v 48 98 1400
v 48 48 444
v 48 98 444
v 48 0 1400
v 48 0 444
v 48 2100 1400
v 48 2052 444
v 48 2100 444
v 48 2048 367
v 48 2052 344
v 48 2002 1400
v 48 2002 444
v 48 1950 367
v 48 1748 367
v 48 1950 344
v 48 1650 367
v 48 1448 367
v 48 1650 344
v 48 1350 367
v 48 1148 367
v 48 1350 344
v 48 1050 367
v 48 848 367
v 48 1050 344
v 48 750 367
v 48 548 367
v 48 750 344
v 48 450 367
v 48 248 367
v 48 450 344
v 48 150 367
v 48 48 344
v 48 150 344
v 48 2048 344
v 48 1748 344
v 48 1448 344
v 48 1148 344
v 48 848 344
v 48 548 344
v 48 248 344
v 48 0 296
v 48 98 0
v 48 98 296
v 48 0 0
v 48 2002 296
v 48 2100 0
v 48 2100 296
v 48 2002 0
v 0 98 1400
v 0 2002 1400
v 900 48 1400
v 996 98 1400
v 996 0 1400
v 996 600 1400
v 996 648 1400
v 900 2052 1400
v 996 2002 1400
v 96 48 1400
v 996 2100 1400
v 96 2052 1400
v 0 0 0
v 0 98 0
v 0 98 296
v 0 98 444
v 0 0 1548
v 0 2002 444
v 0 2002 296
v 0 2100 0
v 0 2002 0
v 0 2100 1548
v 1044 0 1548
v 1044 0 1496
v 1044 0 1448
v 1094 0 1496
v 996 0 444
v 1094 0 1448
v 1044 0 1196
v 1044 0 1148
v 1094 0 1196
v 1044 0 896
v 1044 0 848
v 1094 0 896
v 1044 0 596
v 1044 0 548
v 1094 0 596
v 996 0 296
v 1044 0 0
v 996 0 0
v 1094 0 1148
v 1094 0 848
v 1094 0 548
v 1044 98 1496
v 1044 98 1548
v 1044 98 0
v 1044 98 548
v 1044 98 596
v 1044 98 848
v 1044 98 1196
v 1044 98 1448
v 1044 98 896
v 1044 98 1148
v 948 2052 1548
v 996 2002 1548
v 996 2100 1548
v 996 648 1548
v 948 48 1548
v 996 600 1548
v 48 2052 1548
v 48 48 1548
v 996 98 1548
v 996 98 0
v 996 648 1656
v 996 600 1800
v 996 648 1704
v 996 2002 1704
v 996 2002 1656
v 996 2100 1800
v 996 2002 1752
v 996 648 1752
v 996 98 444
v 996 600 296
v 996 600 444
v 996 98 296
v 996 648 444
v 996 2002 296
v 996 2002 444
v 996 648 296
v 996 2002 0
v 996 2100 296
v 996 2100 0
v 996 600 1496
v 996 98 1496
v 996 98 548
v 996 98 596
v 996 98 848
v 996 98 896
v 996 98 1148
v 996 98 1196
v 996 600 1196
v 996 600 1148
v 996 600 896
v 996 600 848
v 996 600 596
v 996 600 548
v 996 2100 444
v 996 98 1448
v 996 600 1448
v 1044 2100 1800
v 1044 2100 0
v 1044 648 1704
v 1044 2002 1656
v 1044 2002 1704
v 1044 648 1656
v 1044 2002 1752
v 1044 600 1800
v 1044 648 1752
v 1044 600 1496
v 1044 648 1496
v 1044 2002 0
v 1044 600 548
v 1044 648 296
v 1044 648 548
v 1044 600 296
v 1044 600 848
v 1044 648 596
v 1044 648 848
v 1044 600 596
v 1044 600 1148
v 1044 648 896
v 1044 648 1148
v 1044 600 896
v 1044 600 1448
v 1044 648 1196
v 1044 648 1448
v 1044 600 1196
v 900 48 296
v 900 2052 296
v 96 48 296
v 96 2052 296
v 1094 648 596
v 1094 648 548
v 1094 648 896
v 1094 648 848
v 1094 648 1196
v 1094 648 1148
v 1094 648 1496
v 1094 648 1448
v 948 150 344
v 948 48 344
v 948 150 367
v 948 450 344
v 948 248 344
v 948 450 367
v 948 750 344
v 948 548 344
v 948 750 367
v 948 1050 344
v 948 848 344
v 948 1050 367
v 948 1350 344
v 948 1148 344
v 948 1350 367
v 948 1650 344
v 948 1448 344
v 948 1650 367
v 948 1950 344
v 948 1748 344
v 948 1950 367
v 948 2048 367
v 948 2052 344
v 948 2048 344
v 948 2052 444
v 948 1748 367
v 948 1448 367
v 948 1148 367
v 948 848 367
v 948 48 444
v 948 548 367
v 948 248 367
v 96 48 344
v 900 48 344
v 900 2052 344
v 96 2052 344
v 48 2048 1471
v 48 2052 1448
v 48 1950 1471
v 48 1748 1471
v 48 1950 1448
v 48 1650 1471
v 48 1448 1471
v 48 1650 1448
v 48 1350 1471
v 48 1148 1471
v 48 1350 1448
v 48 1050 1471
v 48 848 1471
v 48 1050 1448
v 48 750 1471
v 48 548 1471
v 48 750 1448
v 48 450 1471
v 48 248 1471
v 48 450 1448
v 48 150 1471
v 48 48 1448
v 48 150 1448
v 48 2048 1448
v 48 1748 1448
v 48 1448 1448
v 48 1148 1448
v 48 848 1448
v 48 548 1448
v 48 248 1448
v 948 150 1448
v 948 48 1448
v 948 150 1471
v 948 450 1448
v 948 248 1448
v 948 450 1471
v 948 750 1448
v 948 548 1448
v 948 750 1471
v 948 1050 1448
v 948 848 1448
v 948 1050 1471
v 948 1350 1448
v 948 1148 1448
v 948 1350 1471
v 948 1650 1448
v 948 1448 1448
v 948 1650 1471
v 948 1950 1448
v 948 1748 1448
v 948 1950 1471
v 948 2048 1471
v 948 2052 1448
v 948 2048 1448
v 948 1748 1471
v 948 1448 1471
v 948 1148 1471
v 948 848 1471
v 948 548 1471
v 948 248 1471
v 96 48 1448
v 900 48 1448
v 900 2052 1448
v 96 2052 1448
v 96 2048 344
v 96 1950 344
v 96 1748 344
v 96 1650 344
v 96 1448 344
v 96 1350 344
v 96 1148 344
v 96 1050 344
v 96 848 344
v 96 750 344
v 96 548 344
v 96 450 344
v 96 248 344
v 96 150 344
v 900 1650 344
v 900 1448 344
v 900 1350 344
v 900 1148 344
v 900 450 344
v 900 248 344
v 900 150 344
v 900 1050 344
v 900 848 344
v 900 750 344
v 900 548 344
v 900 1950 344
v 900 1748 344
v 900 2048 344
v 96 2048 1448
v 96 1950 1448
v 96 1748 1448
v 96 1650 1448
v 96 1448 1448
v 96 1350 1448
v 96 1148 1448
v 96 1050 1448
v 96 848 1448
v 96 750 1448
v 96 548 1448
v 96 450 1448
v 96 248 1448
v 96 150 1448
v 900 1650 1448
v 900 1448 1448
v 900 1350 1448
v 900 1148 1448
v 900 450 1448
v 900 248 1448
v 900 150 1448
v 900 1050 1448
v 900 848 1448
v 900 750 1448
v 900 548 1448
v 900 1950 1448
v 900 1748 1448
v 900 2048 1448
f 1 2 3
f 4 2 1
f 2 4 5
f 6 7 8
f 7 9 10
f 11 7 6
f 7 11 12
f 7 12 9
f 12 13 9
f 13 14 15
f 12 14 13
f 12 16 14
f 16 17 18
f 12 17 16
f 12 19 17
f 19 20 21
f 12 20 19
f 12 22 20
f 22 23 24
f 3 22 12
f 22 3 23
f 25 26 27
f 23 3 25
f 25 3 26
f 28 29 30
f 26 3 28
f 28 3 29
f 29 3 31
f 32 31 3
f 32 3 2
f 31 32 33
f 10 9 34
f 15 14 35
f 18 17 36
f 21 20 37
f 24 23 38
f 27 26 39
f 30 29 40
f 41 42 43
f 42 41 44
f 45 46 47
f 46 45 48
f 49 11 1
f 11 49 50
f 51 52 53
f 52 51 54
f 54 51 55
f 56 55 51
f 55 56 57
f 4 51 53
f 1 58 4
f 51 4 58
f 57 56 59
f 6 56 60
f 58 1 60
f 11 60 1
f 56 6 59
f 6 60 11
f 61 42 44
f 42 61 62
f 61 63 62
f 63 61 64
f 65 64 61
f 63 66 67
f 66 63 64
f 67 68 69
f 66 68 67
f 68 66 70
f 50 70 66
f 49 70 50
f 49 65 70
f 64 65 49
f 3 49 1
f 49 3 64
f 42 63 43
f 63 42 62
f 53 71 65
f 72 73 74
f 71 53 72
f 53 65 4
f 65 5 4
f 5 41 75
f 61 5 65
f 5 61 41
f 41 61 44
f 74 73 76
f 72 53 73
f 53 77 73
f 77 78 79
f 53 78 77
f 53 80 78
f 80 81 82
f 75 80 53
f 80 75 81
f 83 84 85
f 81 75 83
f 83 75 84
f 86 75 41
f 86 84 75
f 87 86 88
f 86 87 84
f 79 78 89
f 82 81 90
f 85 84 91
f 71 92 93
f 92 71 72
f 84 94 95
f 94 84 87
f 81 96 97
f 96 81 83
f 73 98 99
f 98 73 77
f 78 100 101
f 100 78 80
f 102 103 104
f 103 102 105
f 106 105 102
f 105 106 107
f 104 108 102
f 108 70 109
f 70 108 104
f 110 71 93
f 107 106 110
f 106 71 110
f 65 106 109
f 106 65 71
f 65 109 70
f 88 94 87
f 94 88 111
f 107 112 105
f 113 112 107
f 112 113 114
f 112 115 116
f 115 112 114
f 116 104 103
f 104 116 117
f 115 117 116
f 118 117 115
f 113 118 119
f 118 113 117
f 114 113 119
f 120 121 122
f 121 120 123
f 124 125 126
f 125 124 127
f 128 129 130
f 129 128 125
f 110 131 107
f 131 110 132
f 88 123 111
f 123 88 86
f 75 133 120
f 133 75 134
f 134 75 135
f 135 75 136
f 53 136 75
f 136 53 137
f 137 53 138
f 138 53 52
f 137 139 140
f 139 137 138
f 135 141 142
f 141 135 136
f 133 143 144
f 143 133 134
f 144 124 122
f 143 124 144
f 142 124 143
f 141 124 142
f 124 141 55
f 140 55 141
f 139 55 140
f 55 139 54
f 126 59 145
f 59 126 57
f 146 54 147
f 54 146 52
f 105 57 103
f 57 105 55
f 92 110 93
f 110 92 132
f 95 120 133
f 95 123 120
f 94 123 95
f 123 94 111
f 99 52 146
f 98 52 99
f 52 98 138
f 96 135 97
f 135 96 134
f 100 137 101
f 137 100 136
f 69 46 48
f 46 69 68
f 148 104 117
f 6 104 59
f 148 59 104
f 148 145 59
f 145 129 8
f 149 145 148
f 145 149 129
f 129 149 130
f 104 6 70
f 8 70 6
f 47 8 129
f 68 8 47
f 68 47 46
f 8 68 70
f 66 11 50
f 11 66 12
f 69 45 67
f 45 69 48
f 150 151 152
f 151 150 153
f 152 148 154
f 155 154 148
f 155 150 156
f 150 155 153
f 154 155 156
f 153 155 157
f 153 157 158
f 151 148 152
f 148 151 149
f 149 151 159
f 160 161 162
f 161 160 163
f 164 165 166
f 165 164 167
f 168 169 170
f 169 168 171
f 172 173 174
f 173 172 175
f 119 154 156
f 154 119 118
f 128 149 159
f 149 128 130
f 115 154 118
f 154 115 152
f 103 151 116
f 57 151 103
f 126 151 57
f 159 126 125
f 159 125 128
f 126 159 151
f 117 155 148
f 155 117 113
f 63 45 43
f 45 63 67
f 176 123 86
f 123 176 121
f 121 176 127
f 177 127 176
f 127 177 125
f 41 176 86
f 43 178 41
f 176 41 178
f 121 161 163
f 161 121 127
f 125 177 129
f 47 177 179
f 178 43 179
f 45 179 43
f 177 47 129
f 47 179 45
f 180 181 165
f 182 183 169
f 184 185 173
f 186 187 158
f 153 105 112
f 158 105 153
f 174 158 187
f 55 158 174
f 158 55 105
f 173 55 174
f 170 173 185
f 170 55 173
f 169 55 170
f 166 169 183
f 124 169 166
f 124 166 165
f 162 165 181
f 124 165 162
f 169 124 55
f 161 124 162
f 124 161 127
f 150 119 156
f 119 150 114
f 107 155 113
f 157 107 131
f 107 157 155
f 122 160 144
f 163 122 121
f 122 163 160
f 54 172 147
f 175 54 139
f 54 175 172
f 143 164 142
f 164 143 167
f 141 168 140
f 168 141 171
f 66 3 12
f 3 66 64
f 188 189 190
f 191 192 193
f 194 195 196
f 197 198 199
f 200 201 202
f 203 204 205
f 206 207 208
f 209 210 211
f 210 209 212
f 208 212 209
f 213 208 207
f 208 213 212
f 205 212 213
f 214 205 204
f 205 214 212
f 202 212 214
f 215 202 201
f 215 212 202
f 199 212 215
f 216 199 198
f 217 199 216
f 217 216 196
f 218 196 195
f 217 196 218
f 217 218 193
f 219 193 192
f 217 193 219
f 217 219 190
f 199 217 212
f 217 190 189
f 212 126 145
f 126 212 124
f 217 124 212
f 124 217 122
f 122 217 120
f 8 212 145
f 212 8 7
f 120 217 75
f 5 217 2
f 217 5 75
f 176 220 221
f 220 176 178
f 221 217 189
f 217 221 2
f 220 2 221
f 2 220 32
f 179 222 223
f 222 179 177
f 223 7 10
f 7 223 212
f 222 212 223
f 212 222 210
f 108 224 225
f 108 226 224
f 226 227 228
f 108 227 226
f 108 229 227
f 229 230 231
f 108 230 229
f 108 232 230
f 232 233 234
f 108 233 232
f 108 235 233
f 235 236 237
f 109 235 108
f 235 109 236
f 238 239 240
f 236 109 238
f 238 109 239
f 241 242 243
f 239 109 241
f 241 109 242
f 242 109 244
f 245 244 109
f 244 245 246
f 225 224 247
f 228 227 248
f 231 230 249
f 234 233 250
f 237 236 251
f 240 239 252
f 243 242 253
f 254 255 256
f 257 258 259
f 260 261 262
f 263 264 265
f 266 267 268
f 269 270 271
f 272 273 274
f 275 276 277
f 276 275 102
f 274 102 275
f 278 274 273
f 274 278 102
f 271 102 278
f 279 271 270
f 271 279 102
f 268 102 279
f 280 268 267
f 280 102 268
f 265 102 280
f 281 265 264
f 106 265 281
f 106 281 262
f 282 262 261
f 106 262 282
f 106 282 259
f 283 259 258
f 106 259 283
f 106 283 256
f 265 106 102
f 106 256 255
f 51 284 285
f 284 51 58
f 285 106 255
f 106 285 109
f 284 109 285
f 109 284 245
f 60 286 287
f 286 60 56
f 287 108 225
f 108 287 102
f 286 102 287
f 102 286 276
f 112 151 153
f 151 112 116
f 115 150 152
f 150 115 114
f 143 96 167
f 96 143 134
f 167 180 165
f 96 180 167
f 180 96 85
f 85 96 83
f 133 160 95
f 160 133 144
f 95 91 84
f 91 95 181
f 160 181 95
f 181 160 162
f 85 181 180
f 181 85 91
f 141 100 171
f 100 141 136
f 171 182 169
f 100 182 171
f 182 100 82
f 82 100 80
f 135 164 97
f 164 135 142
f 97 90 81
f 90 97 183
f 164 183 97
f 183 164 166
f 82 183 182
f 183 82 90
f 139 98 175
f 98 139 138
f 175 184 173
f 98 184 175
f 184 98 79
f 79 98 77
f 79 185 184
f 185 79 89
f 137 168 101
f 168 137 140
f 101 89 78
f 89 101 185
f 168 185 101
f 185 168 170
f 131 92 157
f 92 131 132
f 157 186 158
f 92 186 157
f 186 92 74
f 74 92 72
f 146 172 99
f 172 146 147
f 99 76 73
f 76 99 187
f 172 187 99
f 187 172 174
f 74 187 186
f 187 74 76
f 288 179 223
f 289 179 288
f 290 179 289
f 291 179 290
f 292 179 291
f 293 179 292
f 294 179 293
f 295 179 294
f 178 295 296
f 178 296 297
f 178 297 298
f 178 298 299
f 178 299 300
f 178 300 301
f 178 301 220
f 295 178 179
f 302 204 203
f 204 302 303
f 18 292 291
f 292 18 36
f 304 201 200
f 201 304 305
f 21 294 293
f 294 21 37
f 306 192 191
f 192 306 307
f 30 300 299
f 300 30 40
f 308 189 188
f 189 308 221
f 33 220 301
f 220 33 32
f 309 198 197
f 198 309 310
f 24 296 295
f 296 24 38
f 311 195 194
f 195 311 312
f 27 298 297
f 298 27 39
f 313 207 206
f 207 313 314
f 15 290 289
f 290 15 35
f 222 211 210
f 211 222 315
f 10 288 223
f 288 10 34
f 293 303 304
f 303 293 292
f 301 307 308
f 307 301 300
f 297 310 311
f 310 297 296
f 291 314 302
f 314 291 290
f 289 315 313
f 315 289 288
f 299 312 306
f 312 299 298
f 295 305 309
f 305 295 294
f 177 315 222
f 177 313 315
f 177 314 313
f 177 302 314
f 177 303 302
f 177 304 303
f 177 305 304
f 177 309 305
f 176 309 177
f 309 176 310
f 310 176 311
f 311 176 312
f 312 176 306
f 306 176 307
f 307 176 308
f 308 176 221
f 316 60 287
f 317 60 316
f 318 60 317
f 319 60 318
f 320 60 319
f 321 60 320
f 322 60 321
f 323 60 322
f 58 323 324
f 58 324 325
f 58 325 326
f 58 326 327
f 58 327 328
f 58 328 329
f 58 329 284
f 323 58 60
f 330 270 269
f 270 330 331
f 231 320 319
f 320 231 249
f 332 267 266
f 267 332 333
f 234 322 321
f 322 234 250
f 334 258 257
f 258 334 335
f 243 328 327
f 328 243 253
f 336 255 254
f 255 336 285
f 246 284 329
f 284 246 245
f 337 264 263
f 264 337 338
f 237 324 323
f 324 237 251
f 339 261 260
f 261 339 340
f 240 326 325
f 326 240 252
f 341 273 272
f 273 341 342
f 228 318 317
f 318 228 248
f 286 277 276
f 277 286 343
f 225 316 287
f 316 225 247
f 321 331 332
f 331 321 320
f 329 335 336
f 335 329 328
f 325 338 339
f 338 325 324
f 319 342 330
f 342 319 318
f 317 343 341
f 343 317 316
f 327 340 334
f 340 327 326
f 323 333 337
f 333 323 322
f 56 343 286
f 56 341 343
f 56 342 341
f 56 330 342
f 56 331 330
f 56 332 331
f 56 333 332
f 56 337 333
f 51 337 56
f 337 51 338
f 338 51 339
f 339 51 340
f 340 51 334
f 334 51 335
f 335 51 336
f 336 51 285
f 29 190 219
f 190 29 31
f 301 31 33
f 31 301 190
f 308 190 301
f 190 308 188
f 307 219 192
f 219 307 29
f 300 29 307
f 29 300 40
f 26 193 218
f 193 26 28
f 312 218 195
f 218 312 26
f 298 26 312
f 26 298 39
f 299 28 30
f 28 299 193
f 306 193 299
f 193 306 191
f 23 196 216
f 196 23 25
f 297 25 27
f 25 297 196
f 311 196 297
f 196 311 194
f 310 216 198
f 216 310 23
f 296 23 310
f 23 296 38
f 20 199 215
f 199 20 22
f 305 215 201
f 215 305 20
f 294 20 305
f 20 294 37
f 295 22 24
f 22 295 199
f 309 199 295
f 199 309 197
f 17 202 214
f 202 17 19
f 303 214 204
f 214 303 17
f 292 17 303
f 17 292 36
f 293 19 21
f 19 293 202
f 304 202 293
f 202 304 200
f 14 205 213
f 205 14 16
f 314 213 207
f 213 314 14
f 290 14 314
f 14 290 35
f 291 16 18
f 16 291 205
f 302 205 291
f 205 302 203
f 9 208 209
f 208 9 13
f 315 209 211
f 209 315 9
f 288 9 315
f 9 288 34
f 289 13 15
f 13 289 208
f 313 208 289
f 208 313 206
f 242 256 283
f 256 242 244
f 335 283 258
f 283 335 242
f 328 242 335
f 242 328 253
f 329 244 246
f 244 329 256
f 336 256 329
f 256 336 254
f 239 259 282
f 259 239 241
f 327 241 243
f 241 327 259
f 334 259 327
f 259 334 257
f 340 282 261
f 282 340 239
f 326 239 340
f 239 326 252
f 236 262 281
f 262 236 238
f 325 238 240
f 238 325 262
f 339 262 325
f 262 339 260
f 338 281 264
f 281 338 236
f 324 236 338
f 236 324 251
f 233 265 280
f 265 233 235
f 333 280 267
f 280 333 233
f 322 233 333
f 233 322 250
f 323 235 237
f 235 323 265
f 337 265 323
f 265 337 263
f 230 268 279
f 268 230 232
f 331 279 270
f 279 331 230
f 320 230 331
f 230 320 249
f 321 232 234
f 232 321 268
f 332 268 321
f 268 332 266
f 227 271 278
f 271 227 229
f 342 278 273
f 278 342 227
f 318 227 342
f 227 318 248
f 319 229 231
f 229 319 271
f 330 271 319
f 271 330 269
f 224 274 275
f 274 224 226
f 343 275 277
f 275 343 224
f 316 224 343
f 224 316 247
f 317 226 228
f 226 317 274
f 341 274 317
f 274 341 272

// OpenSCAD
// file: primitives.scad
PILLAR_WIDTH = 48;
PILLAR_DEPTH = 98;

HOR_WIDTH = PILLAR_WIDTH;
HOR_DEPTH = 148;

MADRASS_SUP_WIDTH = 23;
MADRASS_SUP_SEP = 300;

ROOM_WIDTH = 2100;
BED_HEIGHT = 1800;
BED_WIDTH = 900;
UPPER_BED_BOTTOM = 1400;

LADDER_WIDTH = 600;
LADDER_STEP_HEIGHT = 300;

module two_two(height) {
    color("#1b9e77"){cube([PILLAR_WIDTH, PILLAR_WIDTH, height]);};
};

module two_four(height) {
    color("#d95f02"){cube([PILLAR_WIDTH, PILLAR_DEPTH, height]);};
}

module two_six(height) {
    color("#7570b3"){cube([HOR_WIDTH, HOR_DEPTH, height]);};
}

module one_four(height) { 
    color("#e7298a"){cube([MADRASS_SUP_WIDTH, PILLAR_DEPTH, height]);};
}
// main file
include <primitives.scad>;

module pillars () {
    two_four(UPPER_BED_BOTTOM);
    dx = 2*PILLAR_WIDTH + BED_WIDTH;
    
    translate([dx, 0, 0]) {
        two_four(UPPER_BED_BOTTOM + HOR_DEPTH);
   };
   
   dy = ROOM_WIDTH - PILLAR_DEPTH;
   translate([0, dy, 0]){two_four(UPPER_BED_BOTTOM);};
   translate([dx, dy, 0]){two_four(BED_HEIGHT-PILLAR_WIDTH);};
   
   translate([dx, LADDER_WIDTH, 2*HOR_DEPTH]){two_two(BED_HEIGHT-2*HOR_DEPTH);};
}

module supports() {
    // Lower bed
    // Long
    translate([0, ROOM_WIDTH-PILLAR_DEPTH, 2*HOR_DEPTH]){
        rotate([90, 0, 0]){two_six(ROOM_WIDTH-2*PILLAR_DEPTH);};
    };
    
    translate([BED_WIDTH+PILLAR_WIDTH, ROOM_WIDTH, 2*HOR_DEPTH]){
        rotate([90, 0, 0]){two_six(ROOM_WIDTH);};
    };
    
    // Short
    translate([PILLAR_WIDTH, 0, 2*HOR_DEPTH]){rotate([90, 0, 90]){two_six(BED_WIDTH);};};
    
    translate([PILLAR_WIDTH, ROOM_WIDTH - PILLAR_WIDTH, 2*HOR_DEPTH]){rotate([90, 0, 90]){two_six(BED_WIDTH);};};
    
    // Upper bed
    // Long
    translate([0, ROOM_WIDTH, UPPER_BED_BOTTOM]){rotate([90, 0, 0]){two_six(ROOM_WIDTH);};};
    
    translate([BED_WIDTH+PILLAR_WIDTH, ROOM_WIDTH, UPPER_BED_BOTTOM]){
        rotate([90, 0, 0]){two_six(ROOM_WIDTH);};
    };
    
    // Short
    translate([PILLAR_WIDTH, 0, UPPER_BED_BOTTOM]){rotate([90, 0, 90]){two_six(BED_WIDTH);};};
    
    translate([PILLAR_WIDTH, ROOM_WIDTH - PILLAR_WIDTH, UPPER_BED_BOTTOM]){rotate([90, 0, 90]){two_six(BED_WIDTH);};};  
};

module safety() {
    translate([2*PILLAR_WIDTH + BED_WIDTH, ROOM_WIDTH, BED_HEIGHT-PILLAR_WIDTH]){rotate([90, 0, 0]){two_two(ROOM_WIDTH - LADDER_WIDTH);};};
    
    translate([2*PILLAR_WIDTH + BED_WIDTH, ROOM_WIDTH - PILLAR_DEPTH, BED_HEIGHT-3*PILLAR_WIDTH]){rotate([90, 0, 0]){two_two(ROOM_WIDTH - LADDER_WIDTH - PILLAR_DEPTH);};};
}

module ladder_steps() {
    dx = 2*PILLAR_WIDTH + BED_WIDTH;
    ladder_start = 2*HOR_DEPTH + LADDER_STEP_HEIGHT;
    for (i = [0:3]){
        translate([dx, LADDER_WIDTH + PILLAR_WIDTH, ladder_start + i*LADDER_STEP_HEIGHT]){rotate([90, 90, 0]){two_four(LADDER_WIDTH + PILLAR_WIDTH);};};
    }
};

module internal_supports() {
    width = ROOM_WIDTH - 2*PILLAR_WIDTH;
    translate([PILLAR_WIDTH, ROOM_WIDTH-PILLAR_WIDTH, 2*HOR_DEPTH]){rotate([90, 0, 0]){two_two(width);};};
    
    translate([BED_WIDTH, ROOM_WIDTH-PILLAR_WIDTH, 2*HOR_DEPTH]){rotate([90, 0, 0]){two_two(width);};};
    
    translate([PILLAR_WIDTH, ROOM_WIDTH-PILLAR_WIDTH, UPPER_BED_BOTTOM]){rotate([90, 0, 0]){two_two(width);};};
    
    translate([BED_WIDTH, ROOM_WIDTH-PILLAR_WIDTH, UPPER_BED_BOTTOM]){rotate([90, 0, 0]){two_two(width);};};
};

module madrass_support(height) {
    start = MADRASS_SUP_SEP/2;
    for (i = [0:6]) {
        translate([PILLAR_WIDTH, start + i*MADRASS_SUP_SEP, height + PILLAR_WIDTH + MADRASS_SUP_WIDTH]){rotate([90, 90, 90]){one_four(BED_WIDTH);};};
    }
}
pillars();
supports();
safety();
ladder_steps();
internal_supports();
madrass_support(2*HOR_DEPTH);
madrass_support(UPPER_BED_BOTTOM);
